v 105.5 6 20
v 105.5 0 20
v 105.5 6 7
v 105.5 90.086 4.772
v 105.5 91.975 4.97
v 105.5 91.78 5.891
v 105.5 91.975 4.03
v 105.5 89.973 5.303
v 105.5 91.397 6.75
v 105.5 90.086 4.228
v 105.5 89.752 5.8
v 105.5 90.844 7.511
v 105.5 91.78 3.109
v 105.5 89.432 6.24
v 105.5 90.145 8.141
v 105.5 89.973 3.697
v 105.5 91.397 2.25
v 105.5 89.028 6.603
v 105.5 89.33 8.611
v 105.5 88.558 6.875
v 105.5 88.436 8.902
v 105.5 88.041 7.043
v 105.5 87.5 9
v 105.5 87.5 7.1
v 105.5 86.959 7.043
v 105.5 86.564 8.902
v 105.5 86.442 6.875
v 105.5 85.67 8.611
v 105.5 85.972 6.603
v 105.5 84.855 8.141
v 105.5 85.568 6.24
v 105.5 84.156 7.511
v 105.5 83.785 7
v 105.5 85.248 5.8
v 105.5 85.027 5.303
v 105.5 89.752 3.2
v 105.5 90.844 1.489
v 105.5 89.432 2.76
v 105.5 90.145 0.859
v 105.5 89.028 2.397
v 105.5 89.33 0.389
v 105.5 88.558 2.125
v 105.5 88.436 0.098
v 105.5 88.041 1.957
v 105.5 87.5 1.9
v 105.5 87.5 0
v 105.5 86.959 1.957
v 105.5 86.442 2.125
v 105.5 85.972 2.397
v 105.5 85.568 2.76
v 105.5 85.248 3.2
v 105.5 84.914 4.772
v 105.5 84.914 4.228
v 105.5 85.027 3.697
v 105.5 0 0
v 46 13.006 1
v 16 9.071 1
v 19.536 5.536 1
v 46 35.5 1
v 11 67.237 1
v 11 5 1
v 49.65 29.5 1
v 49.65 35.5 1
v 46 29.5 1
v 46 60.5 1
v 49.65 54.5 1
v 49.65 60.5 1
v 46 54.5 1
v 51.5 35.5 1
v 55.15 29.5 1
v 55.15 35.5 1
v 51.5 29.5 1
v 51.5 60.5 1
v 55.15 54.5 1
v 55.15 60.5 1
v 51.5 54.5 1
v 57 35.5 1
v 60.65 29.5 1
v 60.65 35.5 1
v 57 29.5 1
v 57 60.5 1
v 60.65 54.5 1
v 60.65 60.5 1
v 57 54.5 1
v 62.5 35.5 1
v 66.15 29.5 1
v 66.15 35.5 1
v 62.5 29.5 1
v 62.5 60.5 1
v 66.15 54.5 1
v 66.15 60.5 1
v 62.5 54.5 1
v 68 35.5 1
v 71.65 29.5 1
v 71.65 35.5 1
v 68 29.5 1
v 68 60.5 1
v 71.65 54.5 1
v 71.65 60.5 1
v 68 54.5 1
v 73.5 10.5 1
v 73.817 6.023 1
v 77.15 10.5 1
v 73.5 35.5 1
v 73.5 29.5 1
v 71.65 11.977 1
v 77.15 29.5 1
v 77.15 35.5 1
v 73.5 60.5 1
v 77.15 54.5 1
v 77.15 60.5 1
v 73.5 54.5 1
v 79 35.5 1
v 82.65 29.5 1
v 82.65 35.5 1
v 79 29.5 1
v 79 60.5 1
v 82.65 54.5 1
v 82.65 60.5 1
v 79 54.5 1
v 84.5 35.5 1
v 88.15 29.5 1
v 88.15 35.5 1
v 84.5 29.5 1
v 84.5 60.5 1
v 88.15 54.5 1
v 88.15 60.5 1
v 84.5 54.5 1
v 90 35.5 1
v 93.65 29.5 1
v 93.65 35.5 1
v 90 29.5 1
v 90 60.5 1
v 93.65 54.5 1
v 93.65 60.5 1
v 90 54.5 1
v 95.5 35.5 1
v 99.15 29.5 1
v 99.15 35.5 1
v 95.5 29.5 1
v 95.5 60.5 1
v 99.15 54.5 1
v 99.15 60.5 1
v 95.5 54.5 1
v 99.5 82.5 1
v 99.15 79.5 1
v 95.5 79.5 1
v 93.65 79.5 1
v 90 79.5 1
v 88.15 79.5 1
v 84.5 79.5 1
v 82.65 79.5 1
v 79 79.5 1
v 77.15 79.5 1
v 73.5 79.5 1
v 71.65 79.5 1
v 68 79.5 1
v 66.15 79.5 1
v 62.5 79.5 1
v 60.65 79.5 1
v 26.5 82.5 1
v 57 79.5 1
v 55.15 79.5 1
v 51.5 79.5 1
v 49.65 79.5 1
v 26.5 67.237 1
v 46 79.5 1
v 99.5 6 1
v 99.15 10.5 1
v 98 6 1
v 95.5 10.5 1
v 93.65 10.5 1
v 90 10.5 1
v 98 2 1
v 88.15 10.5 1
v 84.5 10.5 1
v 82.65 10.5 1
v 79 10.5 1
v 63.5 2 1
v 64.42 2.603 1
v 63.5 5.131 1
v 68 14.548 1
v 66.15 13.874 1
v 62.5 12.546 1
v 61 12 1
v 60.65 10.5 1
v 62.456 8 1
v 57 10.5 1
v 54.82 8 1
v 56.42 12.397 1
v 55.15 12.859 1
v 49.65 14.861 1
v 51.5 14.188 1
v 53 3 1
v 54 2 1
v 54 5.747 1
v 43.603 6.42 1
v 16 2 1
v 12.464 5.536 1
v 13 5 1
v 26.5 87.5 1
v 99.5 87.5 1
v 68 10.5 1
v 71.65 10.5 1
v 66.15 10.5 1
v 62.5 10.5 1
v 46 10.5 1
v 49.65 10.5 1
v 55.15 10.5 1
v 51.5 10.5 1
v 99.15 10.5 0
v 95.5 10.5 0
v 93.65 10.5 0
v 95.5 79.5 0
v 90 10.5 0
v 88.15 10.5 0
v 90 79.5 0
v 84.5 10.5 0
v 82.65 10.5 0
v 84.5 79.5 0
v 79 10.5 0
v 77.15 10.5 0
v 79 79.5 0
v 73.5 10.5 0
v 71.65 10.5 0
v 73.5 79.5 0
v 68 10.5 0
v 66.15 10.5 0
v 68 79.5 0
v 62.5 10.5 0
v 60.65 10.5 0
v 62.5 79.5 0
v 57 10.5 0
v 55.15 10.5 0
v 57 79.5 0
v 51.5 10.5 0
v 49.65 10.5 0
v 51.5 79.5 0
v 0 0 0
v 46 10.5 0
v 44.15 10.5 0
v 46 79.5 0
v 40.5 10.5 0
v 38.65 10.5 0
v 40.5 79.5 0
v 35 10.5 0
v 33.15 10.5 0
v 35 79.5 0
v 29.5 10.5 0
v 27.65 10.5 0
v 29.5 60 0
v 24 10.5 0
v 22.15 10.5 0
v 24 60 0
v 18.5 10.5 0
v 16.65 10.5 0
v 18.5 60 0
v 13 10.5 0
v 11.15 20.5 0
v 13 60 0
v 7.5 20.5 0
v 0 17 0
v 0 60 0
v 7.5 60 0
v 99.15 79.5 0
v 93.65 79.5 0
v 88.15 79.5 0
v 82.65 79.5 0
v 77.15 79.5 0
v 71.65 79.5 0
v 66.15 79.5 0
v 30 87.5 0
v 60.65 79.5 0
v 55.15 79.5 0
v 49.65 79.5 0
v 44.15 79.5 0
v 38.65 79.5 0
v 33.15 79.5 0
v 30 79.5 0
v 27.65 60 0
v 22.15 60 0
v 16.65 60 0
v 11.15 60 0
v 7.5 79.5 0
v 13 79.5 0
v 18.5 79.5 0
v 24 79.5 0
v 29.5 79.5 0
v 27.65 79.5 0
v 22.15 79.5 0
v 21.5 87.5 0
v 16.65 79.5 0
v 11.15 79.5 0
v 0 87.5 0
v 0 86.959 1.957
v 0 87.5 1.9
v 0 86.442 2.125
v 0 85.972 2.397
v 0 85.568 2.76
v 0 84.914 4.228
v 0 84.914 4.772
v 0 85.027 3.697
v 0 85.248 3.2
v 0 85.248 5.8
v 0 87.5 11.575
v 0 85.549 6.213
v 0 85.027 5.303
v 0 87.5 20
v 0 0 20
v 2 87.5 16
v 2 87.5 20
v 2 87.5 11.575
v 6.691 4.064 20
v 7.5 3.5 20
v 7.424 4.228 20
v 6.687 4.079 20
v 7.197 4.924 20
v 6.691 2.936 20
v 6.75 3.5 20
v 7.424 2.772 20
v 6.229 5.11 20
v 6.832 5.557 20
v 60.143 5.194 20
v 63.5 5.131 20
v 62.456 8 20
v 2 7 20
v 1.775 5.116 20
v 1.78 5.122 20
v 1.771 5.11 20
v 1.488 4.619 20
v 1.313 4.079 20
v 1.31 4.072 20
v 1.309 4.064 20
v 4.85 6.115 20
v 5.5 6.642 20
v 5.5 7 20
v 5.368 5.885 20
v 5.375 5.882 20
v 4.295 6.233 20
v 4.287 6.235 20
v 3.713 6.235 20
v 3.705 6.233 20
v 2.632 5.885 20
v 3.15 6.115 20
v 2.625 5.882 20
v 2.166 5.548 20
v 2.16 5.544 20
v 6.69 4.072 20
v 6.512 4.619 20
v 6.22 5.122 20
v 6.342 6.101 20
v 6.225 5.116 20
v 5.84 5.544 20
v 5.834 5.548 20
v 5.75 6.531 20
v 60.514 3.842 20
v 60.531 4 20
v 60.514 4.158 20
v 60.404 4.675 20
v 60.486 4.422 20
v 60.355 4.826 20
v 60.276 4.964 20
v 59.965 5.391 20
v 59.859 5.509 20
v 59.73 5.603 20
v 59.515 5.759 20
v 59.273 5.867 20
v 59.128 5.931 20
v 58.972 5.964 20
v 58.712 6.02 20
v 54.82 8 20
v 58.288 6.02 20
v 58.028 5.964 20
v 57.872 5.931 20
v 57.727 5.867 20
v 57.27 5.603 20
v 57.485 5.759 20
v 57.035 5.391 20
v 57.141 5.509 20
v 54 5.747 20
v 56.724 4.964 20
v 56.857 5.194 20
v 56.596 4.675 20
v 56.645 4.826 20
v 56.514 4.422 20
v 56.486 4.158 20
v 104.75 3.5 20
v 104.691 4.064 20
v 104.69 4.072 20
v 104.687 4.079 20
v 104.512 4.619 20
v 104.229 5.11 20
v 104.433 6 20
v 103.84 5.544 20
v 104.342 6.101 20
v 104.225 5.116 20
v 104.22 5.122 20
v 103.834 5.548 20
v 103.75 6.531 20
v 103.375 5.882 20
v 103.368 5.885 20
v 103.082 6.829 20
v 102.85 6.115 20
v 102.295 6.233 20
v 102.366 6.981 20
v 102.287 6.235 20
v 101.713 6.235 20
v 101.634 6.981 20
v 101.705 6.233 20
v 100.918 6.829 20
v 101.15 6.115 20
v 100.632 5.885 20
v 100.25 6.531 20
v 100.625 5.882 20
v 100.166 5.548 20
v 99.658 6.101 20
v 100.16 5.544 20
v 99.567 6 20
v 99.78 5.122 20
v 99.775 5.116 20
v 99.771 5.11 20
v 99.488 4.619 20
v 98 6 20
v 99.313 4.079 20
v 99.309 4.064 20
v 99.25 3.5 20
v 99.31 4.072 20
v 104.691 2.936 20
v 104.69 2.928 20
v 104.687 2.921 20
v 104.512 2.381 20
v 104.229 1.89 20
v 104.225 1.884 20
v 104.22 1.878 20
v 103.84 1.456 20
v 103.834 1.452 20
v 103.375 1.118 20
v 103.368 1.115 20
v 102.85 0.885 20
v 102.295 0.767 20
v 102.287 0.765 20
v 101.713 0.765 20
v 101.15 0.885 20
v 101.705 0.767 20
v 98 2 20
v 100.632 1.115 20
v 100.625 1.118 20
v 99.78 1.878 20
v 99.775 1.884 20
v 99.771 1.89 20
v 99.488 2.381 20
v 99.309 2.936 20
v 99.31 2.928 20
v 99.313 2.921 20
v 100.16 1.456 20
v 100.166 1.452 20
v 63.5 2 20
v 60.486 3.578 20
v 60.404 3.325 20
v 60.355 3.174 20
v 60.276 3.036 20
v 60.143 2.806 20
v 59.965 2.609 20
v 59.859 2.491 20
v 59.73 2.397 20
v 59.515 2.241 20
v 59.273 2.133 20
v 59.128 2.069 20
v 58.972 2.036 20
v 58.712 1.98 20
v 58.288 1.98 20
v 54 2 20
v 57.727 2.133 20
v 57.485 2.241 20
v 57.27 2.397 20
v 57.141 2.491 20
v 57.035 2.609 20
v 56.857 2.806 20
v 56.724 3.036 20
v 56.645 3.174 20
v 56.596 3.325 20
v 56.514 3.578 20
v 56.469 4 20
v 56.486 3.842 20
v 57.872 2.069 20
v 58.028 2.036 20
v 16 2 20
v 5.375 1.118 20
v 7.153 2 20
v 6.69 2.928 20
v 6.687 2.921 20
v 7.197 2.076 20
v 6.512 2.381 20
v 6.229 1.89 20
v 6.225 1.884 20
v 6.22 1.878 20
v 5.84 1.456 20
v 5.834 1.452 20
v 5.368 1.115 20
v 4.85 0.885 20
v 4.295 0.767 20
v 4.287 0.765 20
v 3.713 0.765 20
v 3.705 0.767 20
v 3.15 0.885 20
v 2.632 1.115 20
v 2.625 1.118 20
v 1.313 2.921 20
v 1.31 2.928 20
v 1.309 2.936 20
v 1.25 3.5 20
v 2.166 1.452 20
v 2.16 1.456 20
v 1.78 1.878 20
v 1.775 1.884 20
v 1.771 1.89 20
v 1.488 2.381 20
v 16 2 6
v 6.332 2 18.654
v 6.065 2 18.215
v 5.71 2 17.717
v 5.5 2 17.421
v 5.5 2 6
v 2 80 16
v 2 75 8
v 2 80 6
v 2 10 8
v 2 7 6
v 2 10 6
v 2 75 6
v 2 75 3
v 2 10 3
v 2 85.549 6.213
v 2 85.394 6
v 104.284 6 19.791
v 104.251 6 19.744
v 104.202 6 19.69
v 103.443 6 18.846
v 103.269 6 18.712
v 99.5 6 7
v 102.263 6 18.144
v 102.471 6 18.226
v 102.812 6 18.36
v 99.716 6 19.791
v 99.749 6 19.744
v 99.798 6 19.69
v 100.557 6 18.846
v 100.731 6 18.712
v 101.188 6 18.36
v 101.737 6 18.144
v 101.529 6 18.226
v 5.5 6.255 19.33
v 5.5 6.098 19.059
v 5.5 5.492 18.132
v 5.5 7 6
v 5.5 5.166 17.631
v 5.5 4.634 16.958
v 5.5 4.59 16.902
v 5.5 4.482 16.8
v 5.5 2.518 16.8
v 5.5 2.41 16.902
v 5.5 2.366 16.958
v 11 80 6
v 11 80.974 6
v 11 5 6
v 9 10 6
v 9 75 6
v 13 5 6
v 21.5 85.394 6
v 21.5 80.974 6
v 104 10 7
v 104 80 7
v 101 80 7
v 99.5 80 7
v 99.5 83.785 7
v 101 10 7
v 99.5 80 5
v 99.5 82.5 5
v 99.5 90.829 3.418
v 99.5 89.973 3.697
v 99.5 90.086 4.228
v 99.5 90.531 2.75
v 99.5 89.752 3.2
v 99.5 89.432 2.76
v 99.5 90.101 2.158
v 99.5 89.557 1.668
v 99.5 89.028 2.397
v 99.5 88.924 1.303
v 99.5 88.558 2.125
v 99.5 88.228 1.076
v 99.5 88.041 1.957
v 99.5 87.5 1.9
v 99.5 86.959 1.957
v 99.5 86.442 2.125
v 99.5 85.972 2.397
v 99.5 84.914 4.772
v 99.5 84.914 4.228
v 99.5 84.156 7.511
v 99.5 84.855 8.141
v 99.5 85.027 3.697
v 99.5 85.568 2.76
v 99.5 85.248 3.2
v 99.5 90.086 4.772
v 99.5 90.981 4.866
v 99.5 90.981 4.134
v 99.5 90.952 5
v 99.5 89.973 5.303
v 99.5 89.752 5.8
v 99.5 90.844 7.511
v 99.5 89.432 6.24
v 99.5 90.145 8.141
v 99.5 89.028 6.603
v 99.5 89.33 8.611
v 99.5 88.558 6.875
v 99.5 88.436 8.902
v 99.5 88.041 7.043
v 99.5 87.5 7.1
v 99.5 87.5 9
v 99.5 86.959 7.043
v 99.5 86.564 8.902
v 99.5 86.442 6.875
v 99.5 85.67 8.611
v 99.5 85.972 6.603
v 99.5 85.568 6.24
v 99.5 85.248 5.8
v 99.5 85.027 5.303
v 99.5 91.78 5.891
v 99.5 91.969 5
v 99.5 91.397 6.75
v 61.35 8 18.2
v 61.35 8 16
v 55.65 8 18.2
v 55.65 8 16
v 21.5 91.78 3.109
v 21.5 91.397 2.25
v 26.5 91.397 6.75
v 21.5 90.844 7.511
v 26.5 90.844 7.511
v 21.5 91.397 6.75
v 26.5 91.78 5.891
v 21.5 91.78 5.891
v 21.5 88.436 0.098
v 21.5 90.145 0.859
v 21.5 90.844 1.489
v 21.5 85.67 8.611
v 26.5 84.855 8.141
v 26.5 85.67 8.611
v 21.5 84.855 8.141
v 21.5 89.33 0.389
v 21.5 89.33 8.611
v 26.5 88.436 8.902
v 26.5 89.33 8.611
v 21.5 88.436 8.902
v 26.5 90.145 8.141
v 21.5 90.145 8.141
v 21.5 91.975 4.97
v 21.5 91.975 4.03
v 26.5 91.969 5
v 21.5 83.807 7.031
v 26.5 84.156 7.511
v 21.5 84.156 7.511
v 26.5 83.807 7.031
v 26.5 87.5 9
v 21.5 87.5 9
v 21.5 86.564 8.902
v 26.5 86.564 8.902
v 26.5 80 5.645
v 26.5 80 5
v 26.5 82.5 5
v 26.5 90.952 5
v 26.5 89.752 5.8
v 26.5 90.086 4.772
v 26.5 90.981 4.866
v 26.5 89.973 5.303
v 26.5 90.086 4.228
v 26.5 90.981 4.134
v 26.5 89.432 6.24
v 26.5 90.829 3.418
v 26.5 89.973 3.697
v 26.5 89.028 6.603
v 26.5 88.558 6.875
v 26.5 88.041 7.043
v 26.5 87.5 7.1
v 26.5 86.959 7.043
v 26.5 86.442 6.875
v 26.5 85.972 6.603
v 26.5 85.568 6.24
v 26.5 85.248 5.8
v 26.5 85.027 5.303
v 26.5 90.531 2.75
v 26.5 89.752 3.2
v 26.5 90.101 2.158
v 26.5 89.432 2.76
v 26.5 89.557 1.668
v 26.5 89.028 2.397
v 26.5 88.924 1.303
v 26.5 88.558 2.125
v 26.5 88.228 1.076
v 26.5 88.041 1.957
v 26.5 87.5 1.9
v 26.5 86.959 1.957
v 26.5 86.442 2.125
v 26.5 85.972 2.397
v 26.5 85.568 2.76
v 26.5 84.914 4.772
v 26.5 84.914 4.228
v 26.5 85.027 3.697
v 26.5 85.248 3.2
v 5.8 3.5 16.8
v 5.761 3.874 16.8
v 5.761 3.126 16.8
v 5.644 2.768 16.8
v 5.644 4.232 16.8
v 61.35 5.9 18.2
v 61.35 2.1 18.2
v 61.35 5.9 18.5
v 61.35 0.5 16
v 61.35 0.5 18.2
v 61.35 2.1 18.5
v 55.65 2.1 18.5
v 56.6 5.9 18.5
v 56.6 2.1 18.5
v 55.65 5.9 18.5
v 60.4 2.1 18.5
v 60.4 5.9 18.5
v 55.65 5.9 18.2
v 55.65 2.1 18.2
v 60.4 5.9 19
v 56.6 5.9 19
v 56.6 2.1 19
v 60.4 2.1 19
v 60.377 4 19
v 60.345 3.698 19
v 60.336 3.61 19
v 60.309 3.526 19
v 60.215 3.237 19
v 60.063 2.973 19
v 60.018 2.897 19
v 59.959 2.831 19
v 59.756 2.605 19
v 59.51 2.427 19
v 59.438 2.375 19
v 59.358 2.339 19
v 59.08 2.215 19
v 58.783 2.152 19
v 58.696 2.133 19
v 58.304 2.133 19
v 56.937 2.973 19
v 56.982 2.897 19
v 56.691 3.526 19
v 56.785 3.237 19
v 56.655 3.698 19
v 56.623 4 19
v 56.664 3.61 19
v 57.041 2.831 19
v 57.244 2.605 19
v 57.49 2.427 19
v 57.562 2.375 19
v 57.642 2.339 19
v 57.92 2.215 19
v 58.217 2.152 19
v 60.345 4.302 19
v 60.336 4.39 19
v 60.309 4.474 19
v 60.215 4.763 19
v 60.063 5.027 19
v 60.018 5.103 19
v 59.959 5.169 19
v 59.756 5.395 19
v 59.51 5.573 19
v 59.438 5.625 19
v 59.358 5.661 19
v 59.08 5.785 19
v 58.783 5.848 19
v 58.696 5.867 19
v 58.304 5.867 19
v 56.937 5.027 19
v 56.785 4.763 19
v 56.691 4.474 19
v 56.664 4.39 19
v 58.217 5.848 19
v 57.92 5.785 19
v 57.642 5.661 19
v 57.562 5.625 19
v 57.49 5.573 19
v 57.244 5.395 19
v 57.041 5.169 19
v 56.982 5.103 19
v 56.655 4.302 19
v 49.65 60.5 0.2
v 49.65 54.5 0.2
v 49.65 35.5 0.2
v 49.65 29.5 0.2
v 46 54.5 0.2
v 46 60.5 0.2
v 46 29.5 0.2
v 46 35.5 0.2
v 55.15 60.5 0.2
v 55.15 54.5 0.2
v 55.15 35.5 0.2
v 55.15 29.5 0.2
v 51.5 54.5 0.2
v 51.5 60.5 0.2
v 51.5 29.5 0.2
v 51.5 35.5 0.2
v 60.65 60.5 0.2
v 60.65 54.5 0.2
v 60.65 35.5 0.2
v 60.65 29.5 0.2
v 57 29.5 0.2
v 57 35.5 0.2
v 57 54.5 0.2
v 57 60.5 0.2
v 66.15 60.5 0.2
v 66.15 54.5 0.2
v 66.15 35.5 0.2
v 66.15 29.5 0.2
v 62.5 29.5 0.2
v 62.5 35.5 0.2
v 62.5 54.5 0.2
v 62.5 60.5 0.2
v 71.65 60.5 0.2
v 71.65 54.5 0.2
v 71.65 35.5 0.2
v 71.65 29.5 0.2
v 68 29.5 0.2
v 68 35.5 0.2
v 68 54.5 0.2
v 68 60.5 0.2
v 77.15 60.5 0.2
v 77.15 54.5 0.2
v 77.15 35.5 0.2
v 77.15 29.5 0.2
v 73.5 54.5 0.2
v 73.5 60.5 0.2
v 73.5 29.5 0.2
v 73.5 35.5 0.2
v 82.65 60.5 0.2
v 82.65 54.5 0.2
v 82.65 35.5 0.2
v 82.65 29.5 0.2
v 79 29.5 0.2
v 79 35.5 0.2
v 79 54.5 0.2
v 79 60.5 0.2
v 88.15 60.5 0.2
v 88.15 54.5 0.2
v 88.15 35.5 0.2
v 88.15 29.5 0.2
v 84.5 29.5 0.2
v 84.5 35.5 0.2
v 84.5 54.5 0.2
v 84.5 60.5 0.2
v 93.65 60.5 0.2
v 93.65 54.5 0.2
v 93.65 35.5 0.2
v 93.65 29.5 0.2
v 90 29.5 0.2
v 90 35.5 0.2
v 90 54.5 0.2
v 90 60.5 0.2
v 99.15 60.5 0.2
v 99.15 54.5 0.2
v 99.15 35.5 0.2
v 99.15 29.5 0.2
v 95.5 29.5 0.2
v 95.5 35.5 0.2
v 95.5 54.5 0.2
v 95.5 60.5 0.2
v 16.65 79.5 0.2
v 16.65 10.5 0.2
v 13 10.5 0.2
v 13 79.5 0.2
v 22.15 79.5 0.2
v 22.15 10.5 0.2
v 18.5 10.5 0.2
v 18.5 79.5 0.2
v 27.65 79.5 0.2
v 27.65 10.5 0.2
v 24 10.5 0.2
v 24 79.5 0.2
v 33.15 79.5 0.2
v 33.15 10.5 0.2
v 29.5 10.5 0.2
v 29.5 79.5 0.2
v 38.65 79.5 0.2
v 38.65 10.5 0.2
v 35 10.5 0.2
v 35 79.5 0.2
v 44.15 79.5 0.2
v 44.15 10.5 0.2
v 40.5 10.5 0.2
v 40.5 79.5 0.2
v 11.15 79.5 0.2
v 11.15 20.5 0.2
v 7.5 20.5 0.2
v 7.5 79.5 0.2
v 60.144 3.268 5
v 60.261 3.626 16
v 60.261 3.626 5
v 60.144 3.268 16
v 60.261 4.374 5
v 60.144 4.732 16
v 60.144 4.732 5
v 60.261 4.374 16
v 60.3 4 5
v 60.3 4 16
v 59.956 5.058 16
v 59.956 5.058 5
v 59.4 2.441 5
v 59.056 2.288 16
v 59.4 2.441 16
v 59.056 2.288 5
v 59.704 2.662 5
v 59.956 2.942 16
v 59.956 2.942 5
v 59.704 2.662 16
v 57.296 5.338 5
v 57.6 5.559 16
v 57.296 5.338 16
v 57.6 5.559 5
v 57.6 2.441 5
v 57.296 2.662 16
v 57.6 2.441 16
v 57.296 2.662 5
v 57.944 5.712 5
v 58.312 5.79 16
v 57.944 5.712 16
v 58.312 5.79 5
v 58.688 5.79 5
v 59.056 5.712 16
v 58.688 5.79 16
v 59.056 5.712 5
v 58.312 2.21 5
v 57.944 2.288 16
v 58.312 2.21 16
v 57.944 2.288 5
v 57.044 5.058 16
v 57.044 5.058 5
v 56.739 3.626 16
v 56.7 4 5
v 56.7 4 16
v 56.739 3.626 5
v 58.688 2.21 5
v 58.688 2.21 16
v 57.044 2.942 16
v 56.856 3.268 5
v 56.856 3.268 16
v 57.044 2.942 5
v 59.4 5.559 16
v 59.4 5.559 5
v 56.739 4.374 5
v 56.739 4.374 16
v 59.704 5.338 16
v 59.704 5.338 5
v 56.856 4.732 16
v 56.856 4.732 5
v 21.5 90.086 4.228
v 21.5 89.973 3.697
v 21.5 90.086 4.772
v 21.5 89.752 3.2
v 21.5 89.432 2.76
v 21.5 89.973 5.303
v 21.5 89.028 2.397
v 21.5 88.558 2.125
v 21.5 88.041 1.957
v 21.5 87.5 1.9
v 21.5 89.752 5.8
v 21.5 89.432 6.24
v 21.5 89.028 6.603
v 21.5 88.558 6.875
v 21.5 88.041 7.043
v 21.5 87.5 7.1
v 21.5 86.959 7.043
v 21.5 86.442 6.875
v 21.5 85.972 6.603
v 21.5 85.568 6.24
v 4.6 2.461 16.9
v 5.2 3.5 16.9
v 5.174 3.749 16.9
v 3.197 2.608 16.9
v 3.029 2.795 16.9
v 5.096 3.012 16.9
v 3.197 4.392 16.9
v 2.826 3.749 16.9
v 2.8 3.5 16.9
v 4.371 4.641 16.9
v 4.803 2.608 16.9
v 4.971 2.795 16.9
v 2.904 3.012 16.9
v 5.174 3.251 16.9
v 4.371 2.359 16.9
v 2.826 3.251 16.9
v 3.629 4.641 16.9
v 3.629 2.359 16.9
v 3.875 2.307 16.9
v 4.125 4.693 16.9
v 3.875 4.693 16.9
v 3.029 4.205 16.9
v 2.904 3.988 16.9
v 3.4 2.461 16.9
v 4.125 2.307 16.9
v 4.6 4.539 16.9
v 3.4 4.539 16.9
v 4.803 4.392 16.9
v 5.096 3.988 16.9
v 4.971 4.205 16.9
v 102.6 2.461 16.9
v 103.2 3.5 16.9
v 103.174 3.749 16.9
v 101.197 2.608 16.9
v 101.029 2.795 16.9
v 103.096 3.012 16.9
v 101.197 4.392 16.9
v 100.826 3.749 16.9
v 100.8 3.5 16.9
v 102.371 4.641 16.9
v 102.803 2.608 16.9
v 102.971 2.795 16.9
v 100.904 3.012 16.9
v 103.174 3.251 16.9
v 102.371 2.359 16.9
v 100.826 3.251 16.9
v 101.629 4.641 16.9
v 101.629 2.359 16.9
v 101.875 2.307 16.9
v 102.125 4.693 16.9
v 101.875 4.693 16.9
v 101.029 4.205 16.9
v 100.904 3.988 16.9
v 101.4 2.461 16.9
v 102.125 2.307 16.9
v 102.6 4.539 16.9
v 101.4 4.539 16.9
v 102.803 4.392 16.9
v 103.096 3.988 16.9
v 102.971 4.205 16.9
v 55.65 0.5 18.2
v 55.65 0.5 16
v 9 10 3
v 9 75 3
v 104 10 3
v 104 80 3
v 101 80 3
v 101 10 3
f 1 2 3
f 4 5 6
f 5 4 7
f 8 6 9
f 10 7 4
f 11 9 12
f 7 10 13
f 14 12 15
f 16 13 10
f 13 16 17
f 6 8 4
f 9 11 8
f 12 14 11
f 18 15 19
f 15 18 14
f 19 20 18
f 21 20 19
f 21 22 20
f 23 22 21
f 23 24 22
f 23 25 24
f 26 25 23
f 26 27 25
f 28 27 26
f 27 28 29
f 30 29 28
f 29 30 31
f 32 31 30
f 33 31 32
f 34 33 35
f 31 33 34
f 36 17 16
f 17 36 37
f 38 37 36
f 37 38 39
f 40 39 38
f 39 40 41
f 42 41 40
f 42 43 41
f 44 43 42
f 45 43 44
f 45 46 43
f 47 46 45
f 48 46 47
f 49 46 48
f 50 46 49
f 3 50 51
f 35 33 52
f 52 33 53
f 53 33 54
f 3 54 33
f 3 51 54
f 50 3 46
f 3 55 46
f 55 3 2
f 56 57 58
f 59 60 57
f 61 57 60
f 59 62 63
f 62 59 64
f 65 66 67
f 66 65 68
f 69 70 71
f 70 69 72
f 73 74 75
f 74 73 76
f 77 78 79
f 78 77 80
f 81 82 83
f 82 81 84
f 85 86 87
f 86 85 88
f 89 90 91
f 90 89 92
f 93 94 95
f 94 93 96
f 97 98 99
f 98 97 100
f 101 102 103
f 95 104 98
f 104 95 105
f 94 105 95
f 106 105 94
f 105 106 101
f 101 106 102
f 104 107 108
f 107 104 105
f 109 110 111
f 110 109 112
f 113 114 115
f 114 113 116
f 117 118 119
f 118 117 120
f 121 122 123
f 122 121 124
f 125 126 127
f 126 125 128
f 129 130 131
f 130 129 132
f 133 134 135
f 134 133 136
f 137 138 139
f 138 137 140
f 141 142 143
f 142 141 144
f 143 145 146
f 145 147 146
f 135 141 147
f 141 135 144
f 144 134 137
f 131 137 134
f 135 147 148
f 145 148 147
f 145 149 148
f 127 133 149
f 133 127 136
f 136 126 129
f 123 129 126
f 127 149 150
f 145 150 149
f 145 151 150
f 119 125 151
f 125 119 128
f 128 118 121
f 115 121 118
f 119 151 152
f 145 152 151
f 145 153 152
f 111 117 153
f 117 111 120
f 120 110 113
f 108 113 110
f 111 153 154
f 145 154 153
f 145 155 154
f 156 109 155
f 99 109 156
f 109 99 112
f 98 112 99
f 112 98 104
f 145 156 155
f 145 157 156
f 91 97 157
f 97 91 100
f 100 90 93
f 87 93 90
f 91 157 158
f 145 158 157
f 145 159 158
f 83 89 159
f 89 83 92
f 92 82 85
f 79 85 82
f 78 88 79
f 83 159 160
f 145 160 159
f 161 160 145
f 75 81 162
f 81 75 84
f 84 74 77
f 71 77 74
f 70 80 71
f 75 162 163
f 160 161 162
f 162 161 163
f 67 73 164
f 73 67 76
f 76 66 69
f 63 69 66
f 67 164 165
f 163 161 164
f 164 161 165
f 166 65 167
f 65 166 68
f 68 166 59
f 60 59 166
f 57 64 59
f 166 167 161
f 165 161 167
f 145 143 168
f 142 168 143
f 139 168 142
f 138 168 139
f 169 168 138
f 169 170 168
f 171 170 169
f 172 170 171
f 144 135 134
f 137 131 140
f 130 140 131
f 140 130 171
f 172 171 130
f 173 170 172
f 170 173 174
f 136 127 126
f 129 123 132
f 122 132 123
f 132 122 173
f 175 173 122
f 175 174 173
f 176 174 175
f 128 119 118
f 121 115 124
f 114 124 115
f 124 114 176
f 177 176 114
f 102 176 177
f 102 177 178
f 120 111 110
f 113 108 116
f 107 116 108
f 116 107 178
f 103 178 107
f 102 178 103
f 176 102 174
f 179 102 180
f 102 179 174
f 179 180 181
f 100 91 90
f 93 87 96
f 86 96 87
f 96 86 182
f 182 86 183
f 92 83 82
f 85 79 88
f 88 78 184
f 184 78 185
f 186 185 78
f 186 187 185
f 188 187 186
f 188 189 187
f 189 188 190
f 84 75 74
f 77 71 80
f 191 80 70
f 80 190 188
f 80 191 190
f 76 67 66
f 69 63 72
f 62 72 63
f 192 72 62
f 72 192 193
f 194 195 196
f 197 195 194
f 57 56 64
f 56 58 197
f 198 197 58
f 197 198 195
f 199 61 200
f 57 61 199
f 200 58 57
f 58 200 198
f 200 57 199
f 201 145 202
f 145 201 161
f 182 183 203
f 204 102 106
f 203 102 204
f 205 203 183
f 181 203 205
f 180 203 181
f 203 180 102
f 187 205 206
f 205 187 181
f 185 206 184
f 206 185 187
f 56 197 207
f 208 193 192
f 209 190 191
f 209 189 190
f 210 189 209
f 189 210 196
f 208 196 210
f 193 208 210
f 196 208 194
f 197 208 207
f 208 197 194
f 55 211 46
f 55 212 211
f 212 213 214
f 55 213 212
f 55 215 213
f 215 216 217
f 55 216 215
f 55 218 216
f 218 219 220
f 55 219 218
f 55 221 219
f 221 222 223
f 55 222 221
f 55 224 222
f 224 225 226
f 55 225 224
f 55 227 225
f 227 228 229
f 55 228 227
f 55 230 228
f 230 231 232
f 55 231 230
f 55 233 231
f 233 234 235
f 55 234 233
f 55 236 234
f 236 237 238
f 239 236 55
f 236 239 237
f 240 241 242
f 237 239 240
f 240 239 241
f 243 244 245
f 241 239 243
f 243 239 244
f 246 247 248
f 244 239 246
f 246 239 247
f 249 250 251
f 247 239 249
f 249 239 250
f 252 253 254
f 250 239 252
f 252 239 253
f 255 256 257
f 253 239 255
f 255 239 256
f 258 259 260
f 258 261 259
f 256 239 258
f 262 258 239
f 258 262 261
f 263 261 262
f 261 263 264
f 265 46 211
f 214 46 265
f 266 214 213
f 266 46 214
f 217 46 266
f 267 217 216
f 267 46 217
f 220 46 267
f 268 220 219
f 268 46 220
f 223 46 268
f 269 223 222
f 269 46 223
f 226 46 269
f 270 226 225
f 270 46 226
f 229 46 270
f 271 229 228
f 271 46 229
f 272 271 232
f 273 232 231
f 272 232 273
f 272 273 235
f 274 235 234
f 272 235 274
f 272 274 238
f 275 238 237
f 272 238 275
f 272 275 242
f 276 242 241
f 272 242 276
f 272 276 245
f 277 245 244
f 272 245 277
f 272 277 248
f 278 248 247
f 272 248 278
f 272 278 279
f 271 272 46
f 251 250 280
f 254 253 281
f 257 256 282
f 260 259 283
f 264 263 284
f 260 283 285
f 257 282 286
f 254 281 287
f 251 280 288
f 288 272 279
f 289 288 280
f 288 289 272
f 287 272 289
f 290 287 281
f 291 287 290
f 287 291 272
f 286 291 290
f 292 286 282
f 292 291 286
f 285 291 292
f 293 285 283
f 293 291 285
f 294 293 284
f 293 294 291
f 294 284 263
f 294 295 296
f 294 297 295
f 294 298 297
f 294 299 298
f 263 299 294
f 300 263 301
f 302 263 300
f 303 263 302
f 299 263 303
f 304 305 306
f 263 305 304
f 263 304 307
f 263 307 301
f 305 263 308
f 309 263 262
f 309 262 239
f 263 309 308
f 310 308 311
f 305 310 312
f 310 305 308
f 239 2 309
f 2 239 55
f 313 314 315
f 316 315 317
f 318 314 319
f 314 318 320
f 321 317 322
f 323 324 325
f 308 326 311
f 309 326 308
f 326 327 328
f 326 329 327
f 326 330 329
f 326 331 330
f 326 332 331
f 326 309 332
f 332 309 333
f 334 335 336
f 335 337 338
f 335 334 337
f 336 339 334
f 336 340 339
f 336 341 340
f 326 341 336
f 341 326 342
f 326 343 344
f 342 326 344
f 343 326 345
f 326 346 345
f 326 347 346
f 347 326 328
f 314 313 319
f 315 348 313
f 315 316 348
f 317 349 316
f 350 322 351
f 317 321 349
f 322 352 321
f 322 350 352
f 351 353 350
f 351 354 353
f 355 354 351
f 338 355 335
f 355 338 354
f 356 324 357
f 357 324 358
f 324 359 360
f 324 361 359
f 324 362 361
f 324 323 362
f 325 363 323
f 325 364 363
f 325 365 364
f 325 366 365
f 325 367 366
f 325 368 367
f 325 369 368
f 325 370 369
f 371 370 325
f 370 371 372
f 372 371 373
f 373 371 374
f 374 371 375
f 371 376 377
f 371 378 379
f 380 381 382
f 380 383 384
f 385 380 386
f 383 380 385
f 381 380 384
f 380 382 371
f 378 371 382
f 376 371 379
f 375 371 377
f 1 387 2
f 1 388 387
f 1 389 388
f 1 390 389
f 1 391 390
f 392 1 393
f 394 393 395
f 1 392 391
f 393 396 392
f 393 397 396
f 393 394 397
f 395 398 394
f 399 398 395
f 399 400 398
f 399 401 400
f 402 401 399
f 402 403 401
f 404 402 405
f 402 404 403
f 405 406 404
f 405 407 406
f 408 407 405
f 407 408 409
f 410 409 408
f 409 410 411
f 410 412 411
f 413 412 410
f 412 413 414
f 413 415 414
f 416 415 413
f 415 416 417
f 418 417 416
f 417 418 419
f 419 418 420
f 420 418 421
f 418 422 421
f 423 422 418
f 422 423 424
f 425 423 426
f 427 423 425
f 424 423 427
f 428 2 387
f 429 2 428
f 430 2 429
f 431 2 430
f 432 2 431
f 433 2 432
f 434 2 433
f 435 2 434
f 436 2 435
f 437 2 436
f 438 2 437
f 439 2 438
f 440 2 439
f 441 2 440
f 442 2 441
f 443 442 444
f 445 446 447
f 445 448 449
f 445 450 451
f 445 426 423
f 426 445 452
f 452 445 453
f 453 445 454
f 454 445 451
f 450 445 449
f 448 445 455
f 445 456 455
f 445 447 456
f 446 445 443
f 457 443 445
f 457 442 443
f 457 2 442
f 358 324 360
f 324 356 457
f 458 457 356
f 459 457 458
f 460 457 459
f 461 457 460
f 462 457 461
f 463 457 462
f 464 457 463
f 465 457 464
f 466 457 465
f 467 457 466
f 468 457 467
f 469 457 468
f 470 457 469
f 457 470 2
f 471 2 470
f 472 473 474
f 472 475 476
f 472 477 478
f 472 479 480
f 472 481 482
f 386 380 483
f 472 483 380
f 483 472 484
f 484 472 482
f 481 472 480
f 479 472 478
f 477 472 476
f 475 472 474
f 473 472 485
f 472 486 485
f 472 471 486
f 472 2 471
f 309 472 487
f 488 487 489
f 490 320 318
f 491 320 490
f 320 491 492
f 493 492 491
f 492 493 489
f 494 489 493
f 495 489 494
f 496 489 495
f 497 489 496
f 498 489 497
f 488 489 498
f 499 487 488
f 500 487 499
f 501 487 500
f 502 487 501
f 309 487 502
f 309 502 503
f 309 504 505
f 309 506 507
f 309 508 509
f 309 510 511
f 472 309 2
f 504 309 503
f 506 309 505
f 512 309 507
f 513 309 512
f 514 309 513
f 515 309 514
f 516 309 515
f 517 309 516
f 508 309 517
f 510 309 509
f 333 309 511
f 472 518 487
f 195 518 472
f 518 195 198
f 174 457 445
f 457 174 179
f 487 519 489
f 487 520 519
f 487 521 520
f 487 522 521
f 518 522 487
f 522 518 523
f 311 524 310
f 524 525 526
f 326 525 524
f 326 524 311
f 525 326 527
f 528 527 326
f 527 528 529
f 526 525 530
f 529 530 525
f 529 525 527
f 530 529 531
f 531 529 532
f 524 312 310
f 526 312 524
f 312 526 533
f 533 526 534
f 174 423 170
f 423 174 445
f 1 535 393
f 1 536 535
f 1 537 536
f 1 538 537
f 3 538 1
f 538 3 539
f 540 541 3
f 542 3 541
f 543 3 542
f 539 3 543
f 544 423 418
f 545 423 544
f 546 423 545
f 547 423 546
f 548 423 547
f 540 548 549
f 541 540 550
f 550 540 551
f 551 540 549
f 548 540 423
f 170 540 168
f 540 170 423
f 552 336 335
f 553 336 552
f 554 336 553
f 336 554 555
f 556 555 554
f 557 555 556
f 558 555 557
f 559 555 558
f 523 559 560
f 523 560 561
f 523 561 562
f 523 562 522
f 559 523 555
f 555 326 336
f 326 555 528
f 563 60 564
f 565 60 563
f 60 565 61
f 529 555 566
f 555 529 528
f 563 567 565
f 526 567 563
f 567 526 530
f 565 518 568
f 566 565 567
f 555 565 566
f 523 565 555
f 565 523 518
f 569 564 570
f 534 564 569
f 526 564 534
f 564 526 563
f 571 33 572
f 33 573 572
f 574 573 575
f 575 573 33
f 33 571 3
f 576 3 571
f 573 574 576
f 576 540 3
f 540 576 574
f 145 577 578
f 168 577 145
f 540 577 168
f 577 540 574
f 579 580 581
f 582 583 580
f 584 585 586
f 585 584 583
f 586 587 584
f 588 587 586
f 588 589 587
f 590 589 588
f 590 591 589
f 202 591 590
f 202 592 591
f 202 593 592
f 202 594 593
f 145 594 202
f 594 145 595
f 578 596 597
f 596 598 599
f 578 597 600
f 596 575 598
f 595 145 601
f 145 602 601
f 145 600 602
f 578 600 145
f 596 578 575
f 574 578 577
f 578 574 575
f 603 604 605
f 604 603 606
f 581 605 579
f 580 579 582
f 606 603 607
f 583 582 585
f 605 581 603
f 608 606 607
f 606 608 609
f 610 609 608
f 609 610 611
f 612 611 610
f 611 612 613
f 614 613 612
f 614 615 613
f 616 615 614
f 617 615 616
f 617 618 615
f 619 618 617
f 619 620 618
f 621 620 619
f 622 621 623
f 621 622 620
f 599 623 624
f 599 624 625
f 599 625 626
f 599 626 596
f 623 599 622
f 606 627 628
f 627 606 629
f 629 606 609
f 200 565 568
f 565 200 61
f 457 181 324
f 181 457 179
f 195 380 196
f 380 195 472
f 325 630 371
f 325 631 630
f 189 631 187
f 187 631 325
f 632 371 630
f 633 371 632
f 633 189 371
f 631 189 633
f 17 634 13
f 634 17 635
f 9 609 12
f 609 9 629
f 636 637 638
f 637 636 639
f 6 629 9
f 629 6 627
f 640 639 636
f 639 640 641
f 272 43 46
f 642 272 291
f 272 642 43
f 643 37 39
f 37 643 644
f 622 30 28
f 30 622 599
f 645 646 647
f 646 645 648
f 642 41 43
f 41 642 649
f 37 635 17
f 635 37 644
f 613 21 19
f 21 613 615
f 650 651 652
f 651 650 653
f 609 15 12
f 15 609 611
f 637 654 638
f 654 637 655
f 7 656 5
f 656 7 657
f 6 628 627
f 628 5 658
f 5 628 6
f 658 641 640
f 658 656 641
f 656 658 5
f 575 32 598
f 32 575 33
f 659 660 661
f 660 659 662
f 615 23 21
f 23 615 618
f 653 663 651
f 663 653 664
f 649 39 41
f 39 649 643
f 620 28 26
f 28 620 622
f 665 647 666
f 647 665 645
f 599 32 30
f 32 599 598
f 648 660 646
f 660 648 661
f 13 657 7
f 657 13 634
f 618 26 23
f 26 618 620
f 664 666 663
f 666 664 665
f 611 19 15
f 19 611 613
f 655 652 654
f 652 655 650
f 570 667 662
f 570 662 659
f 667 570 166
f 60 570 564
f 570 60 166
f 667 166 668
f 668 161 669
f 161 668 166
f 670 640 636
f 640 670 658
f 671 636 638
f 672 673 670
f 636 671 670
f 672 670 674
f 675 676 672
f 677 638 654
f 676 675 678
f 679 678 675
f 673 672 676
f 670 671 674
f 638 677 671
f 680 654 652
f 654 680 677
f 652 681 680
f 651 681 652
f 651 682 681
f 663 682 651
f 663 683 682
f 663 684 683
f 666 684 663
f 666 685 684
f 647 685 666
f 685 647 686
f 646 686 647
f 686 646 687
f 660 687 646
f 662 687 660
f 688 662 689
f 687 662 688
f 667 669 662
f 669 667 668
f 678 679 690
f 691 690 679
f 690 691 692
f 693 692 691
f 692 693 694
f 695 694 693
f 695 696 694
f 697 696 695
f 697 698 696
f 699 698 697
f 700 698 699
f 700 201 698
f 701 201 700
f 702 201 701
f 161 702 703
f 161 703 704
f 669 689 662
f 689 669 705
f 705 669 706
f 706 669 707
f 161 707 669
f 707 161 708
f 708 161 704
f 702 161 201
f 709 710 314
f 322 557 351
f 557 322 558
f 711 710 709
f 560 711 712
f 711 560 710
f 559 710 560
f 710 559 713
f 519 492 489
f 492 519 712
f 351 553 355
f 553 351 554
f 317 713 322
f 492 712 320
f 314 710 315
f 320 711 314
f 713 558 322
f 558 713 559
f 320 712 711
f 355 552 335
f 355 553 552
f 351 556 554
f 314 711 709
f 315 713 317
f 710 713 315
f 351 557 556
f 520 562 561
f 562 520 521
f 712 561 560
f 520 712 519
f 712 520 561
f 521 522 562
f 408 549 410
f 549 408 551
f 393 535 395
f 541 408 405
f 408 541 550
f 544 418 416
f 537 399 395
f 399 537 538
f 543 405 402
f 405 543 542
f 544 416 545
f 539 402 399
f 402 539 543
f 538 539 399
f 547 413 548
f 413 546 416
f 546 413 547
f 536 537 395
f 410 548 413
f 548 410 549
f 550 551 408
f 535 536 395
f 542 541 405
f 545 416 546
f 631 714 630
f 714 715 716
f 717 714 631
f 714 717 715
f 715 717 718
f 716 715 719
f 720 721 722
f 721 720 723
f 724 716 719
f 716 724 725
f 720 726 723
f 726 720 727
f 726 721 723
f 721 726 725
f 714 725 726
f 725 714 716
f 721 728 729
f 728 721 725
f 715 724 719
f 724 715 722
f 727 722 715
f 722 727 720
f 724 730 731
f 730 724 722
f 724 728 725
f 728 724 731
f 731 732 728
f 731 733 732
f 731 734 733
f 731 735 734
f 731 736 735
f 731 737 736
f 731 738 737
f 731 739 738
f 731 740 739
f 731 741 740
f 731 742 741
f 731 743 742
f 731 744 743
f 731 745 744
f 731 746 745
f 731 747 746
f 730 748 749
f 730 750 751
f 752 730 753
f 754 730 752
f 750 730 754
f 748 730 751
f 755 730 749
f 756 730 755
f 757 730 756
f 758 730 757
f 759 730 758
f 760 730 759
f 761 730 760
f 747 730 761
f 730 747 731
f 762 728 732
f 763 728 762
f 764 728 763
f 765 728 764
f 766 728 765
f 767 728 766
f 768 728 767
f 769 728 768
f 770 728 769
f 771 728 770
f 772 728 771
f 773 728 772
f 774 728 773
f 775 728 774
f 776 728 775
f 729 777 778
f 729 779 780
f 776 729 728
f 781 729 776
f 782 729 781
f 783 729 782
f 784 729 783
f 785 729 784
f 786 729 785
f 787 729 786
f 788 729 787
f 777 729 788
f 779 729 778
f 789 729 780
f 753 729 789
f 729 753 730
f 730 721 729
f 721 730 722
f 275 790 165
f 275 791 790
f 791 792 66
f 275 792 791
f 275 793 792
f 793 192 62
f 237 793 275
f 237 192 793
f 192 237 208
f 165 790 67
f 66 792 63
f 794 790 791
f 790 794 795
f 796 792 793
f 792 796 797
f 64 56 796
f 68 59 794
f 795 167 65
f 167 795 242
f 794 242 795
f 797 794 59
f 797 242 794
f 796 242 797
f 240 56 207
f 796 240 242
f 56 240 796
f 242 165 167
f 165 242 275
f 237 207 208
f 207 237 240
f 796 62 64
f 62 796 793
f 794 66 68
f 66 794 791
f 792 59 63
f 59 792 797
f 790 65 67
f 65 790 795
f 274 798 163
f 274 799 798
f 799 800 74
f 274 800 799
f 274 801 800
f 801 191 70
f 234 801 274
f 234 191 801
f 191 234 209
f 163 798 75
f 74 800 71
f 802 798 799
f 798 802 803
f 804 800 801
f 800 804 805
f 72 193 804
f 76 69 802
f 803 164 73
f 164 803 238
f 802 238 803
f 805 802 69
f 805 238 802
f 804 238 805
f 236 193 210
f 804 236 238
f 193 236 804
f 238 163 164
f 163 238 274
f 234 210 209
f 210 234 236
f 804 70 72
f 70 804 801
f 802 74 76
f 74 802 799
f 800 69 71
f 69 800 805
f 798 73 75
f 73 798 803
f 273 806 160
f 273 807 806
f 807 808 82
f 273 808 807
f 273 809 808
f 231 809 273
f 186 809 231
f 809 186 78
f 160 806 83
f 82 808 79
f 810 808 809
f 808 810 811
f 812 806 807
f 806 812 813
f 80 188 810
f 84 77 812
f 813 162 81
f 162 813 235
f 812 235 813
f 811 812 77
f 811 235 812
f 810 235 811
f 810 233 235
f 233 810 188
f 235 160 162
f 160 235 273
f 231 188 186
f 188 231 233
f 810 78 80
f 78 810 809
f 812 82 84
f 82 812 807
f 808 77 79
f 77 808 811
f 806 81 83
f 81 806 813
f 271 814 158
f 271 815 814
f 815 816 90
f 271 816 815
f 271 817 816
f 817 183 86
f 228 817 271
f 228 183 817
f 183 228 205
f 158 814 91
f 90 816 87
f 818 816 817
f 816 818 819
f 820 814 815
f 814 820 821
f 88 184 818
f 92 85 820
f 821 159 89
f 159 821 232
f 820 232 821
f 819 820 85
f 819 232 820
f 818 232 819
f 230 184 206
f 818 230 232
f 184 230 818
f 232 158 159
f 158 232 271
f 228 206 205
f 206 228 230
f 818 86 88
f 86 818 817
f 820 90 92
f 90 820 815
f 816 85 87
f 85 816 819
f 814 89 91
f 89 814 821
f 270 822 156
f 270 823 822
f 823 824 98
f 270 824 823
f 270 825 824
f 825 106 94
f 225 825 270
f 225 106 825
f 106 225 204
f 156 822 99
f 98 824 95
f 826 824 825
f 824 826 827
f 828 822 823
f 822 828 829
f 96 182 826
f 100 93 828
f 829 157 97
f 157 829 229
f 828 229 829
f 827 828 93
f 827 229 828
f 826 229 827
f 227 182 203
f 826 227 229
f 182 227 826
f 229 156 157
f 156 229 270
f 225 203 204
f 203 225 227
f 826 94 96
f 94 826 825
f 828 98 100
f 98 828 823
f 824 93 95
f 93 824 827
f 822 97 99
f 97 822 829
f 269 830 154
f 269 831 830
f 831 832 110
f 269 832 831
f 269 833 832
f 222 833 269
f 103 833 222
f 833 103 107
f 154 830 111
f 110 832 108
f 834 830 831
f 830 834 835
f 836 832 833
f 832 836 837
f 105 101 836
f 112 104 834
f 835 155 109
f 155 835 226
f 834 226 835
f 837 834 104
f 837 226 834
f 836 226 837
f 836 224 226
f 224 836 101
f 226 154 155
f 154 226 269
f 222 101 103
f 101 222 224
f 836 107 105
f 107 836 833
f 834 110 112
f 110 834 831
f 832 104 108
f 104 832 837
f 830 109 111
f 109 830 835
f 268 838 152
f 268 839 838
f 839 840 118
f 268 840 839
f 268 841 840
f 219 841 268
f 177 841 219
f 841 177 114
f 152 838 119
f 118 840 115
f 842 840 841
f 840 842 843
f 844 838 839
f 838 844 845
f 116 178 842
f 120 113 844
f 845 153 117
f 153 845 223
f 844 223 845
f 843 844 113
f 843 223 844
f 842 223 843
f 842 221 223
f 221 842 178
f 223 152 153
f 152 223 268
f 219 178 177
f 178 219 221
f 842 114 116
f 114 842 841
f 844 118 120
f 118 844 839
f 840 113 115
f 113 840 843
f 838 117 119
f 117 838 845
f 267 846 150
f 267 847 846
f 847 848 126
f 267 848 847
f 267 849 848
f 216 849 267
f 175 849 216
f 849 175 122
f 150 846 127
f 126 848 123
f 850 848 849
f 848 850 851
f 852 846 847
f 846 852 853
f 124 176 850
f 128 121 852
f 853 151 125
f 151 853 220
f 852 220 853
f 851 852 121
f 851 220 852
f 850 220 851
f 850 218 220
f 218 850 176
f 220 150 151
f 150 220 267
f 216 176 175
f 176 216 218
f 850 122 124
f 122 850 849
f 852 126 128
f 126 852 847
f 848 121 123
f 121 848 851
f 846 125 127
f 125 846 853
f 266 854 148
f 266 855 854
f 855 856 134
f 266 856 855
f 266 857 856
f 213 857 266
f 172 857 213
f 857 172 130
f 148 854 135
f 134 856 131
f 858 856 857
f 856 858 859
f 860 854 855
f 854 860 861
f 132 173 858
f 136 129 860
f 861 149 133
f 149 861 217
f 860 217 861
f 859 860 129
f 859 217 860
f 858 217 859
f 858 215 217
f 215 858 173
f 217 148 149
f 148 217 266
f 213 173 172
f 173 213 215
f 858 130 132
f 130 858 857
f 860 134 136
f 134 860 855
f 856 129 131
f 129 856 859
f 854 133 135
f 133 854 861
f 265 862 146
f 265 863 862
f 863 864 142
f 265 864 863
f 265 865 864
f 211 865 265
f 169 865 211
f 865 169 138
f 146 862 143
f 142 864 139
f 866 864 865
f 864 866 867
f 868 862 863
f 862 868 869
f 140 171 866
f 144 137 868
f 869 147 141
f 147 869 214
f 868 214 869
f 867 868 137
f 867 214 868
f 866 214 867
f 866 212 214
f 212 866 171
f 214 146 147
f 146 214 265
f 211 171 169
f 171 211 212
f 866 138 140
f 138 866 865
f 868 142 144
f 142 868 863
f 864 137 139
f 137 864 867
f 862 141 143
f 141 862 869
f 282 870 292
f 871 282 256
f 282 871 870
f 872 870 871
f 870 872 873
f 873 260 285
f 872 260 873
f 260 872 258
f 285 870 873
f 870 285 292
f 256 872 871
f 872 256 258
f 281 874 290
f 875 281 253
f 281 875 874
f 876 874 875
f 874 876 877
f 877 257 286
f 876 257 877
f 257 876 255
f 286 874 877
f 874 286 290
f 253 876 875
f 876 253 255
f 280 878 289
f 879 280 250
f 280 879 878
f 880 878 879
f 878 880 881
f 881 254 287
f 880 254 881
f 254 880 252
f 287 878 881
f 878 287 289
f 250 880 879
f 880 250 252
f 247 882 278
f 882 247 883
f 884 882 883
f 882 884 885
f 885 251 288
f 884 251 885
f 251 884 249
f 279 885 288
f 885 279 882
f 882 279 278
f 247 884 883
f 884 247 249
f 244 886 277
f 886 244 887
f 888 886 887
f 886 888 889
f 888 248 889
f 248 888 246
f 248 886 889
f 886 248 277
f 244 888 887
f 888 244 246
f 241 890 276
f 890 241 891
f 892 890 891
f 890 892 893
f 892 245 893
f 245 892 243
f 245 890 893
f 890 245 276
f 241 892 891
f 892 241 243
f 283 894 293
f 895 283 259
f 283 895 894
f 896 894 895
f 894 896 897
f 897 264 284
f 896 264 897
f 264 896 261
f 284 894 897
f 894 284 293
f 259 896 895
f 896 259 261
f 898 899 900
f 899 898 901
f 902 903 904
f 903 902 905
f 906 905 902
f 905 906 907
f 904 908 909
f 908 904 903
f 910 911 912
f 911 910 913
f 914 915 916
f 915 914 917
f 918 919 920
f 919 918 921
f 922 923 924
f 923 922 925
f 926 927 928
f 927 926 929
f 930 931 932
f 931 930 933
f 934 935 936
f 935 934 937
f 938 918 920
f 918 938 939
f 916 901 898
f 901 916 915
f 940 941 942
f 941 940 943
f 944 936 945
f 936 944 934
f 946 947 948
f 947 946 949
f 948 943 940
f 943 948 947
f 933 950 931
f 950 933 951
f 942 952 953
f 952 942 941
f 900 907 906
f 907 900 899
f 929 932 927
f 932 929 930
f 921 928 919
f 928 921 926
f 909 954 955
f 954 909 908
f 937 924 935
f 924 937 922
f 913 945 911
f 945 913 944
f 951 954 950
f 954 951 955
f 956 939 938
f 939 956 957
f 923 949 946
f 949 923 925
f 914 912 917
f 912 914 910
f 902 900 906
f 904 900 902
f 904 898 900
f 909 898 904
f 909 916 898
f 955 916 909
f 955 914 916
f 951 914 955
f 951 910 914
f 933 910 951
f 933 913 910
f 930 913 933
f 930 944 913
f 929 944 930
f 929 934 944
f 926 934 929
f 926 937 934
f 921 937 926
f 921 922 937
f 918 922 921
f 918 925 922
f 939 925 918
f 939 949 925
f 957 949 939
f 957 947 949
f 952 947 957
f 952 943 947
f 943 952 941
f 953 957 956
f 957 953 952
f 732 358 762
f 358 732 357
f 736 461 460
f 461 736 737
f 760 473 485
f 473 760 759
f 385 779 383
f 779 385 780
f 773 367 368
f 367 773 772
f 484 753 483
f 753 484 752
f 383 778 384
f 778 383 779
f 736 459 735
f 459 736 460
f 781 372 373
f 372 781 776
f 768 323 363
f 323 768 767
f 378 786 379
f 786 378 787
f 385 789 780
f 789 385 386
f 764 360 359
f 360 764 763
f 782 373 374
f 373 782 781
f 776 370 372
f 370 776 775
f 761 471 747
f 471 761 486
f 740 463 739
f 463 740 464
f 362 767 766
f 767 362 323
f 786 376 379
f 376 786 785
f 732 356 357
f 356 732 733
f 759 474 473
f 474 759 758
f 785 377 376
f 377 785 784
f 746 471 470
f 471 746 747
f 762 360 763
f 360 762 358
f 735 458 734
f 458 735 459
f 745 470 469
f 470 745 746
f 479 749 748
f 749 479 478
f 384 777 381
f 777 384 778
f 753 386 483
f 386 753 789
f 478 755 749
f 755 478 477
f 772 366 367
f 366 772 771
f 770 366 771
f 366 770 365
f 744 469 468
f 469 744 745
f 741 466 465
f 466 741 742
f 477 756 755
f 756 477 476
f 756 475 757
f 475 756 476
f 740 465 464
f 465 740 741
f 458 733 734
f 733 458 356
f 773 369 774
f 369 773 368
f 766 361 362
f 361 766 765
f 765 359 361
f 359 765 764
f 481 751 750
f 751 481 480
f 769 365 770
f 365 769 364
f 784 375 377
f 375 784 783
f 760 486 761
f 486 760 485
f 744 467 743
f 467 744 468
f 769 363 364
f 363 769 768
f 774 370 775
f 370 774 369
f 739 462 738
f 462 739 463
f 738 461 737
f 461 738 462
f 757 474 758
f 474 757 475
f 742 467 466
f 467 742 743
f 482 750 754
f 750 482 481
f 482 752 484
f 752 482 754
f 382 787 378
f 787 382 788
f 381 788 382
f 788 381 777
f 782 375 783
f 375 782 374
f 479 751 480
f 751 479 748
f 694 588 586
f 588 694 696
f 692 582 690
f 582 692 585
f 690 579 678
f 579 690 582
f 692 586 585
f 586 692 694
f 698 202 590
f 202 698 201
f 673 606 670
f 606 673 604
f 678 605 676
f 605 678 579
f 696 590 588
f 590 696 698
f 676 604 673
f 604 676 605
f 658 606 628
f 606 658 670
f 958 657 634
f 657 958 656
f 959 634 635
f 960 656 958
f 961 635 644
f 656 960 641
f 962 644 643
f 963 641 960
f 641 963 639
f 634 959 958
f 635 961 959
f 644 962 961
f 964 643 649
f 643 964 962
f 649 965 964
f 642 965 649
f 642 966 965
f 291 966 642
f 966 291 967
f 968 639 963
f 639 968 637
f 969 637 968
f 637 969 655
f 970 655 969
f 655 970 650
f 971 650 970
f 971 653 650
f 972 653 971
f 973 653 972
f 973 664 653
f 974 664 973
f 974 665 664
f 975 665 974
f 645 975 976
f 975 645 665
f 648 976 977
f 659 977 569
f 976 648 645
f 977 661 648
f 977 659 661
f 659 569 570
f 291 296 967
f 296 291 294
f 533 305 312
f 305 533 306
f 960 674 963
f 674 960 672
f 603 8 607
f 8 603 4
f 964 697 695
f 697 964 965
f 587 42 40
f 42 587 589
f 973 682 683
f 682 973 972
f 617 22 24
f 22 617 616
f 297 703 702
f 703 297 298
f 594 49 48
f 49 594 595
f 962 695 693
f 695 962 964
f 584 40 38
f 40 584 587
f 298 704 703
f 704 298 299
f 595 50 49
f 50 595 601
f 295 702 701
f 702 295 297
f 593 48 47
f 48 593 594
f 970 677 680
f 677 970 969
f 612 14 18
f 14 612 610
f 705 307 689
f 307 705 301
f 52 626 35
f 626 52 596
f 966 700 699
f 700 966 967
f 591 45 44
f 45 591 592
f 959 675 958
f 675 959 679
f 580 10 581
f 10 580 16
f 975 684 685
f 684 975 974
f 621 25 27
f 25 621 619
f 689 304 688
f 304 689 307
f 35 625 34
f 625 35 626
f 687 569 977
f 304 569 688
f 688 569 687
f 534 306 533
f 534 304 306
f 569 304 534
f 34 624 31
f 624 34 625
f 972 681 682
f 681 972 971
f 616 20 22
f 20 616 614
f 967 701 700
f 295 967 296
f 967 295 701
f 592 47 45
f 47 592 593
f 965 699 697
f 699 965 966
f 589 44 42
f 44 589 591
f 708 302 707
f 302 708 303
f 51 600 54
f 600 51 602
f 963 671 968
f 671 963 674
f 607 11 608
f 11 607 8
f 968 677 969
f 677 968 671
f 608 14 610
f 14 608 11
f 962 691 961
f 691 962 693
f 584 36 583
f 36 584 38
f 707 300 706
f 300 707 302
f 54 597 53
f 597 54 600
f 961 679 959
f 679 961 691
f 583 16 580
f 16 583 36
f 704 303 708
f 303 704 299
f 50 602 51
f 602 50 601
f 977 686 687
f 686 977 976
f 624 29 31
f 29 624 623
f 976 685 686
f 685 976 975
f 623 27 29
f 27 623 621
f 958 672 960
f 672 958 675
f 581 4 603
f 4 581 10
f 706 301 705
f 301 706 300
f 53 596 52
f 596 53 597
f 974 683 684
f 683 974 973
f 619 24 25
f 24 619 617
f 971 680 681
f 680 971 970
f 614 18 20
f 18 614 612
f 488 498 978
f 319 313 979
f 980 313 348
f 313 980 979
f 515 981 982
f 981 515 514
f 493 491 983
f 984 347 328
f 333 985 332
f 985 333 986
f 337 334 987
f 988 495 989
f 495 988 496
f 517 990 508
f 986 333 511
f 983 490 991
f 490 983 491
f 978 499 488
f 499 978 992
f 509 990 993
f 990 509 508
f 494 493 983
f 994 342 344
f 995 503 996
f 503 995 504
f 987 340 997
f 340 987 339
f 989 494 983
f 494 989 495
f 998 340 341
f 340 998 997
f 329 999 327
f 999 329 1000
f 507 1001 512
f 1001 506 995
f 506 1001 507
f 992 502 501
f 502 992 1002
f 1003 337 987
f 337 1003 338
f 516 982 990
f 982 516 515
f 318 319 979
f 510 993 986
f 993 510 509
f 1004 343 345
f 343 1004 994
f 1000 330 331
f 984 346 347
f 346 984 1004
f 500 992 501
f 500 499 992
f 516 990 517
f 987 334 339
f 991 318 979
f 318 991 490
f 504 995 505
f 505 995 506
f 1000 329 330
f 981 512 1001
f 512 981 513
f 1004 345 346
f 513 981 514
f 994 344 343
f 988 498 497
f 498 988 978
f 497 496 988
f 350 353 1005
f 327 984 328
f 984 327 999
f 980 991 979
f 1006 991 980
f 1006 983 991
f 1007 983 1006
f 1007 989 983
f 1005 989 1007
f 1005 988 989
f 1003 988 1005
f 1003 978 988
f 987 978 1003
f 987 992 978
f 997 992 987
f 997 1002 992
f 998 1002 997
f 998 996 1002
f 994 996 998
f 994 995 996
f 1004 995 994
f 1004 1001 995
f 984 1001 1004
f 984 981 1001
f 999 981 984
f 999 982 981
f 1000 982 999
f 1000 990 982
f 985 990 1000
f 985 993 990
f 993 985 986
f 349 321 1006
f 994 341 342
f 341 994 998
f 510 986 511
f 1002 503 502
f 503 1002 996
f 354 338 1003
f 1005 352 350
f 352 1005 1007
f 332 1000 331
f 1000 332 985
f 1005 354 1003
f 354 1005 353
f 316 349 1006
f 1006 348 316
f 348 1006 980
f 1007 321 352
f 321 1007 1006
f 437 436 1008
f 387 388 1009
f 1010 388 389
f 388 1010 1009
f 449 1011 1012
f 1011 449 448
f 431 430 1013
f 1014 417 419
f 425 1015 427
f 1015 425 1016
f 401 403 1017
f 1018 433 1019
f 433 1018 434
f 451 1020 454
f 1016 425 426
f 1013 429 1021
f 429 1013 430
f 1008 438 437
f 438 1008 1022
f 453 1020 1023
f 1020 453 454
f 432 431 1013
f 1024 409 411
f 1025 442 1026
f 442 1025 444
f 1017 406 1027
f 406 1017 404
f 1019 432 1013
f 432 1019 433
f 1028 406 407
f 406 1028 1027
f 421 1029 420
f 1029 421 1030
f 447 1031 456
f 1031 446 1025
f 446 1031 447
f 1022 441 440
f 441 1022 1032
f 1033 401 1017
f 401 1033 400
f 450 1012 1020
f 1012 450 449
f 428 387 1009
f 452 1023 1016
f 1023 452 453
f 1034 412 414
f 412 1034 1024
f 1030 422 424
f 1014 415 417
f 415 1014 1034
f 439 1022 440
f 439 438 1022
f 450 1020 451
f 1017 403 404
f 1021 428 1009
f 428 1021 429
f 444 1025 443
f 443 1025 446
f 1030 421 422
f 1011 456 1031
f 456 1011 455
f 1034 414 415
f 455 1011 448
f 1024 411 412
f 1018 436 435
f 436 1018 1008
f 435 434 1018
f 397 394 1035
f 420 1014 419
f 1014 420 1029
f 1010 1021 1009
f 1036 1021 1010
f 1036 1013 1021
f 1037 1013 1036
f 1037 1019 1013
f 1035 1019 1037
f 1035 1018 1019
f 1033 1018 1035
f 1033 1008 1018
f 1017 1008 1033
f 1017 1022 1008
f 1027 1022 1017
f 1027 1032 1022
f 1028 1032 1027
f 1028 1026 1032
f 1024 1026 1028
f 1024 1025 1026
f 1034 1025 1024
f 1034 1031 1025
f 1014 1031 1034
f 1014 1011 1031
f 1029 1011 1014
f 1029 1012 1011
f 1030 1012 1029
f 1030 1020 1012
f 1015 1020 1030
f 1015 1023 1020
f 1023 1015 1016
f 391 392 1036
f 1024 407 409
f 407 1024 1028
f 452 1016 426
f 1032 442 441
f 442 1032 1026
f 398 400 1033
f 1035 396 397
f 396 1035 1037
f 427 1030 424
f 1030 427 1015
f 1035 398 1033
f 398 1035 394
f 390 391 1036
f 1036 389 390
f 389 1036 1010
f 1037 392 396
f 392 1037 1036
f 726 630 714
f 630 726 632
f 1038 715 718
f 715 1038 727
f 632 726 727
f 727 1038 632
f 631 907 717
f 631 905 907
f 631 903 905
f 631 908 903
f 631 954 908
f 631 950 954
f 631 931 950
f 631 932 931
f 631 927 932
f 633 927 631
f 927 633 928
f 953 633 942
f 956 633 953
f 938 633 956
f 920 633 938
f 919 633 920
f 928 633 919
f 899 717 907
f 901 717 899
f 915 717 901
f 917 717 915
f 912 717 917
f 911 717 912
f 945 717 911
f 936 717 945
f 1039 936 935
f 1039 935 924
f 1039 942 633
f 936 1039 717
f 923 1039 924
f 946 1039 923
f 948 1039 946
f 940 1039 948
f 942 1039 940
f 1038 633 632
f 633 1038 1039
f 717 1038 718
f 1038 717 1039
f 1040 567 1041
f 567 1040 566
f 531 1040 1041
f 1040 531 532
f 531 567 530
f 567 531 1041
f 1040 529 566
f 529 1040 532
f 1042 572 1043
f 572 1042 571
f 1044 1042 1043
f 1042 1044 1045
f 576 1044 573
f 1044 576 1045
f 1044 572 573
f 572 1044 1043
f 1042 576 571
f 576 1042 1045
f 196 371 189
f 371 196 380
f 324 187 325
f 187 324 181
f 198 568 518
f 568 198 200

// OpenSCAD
// PRUSA iteration3
// RAMBo doors
// GNU GPL v3
// Josef Průša <iam@josefprusa.cz> and contributors
// http://www.reprap.org/wiki/Prusa_Mendel
// http://prusamendel.org

module body(){
  // Side panels.
  cube([105.5,87.5,1]);
  cube([105.5,2,20]);
  cube([2,87.5,20]);

  // Corner reinforcement.
  translate([98,1,0]) cube([7.5,5,20]);
  translate([0.5,0.5,0]) cube([5,6.5,20]);
  translate([1,0,0]) cube([10,87.5,6]);
  translate([99.5,0,0]) cube([6,87.5,7]);
  translate([10,0,0]) cube([6,5,6]);

  // Screw thread body.
  translate([54,2,0]) cube([9.5,6,20]);

  // Rounded side.
  translate([0,87.5,4.5]) rotate([0,90,0]) cylinder(h=105.5,r=4.5,$fn=30);

  // Upper hinge reinforcement.
  translate([0.5,69,-9]) rotate([20,0,0]) cube([26,20,10]);

  // Door closing.
  translate([4,3.5,16.8]) rotate([0,0,0]) cylinder(h=3.2,r1=1.8,r2=3.5,$fn=30);
  translate([102,3.5,16.8]) rotate([0,0,0]) cylinder(h=3.2,r1=1.8,r2=3.5,$fn=30);
}

module ventilation_holes(){
  for(i=[0 : 9]){
    translate([46+(i*5.5),10.5,-1]) cube([3.65,19+50,1.2]);
    translate([46+(i*5.5),10.5,-1]) cube([3.65,19,10]);
    translate([46+(i*5.5),10.5+25,-1]) cube([3.65,19,10]);
    translate([46+(i*5.5),10.5+50,-1]) cube([3.65,19,10]);
  }
  for(i=[-6 : 0]){
    translate([46+(i*5.5),10.5,-1]) cube([3.65,19+50,1.2]);
  }
  for(i=[-7 : -6]){
    translate([46+(i*5.5),20.5,-1]) cube([3.65,19+40,1.2]);
  }
}

module cutouts(){
  // Door closing screw.
  translate([58.5,4,5]) cylinder(h=17,r=1.8,$fn=30);
  translate([58.5,4,18.5]) cylinder(h=2.6,r1=1.8,r2=2.2,$fn=30);
  translate([58.5,4,15.5]){
  translate([0,0,2.5]) cube([5.7,3.8,1],center=true);
  translate([0,0,3]) cube([3.8,3.8,1],center=true);}

  ventilation_holes();

  // Rounded side cutoff.
  translate([26.5,87.5 ,4.5]) rotate([0,90,0]) cylinder(h=73,r=3.5,$fn=30);
  translate([26.5,80,5]) cube([73,19,10]);
  translate([26.5,82.5,1]) cube([73,5,10]);

  // Upper hinge cut.
  translate([0,60,-10]) cube([30,30,10]);
  translate([-1,87.5,0]) cube([22.5,10,10]);

  // Upper hinge.
  translate([2, 80,6]) cube([19.5,10,10]);
  translate([-2,89.7,3]) rotate([70,0,0]) cube([19.5,10,5]);
  translate([-5,87.5,4.5]) rotate([0,90,0]) cylinder(h=26.5,r=2.5,$fn=30);

  // Hinge hole.
  translate([-5,87.5,4.5]) rotate([0,90,0]) cylinder(h=120,r=2.6,$fn=30);

  // Door closing.
  translate([4,3.5,16.9]) rotate([0,0,0]) cylinder(h=3.2,r1=1.2,r2=2.8,$fn=30);
  translate([102,3.5,16.9]) rotate([0,0,0]) cylinder(h=3.2,r1=1.2,r2=2.8,$fn=30);

  // M3 NUT.
  translate([55.65,0.5,16]) cube([5.7,10,2.2]);

  // Side panel lightning slot.
  translate([2,10,3]) cube([7,65,5]);
  translate([101,10,3]) cube([3,70,5]);

  // Corners - cut.
  translate([53,3,1]) rotate([0,0,70]) cube([10,10,50]);
  translate([61,12,1]) rotate([0,0,-70]) cube([10,10,50]);
  translate([16,2,1]) rotate([0,0,45]) cube([5,5,50]);
}

module RAMBo_doors(){
  difference(){
    body();
    cutouts();
    // Large corner cut.
    translate([0 -20,-3]) rotate([0,45,45]) cube([30,30,20]);
  }
}

RAMBo_doors();
